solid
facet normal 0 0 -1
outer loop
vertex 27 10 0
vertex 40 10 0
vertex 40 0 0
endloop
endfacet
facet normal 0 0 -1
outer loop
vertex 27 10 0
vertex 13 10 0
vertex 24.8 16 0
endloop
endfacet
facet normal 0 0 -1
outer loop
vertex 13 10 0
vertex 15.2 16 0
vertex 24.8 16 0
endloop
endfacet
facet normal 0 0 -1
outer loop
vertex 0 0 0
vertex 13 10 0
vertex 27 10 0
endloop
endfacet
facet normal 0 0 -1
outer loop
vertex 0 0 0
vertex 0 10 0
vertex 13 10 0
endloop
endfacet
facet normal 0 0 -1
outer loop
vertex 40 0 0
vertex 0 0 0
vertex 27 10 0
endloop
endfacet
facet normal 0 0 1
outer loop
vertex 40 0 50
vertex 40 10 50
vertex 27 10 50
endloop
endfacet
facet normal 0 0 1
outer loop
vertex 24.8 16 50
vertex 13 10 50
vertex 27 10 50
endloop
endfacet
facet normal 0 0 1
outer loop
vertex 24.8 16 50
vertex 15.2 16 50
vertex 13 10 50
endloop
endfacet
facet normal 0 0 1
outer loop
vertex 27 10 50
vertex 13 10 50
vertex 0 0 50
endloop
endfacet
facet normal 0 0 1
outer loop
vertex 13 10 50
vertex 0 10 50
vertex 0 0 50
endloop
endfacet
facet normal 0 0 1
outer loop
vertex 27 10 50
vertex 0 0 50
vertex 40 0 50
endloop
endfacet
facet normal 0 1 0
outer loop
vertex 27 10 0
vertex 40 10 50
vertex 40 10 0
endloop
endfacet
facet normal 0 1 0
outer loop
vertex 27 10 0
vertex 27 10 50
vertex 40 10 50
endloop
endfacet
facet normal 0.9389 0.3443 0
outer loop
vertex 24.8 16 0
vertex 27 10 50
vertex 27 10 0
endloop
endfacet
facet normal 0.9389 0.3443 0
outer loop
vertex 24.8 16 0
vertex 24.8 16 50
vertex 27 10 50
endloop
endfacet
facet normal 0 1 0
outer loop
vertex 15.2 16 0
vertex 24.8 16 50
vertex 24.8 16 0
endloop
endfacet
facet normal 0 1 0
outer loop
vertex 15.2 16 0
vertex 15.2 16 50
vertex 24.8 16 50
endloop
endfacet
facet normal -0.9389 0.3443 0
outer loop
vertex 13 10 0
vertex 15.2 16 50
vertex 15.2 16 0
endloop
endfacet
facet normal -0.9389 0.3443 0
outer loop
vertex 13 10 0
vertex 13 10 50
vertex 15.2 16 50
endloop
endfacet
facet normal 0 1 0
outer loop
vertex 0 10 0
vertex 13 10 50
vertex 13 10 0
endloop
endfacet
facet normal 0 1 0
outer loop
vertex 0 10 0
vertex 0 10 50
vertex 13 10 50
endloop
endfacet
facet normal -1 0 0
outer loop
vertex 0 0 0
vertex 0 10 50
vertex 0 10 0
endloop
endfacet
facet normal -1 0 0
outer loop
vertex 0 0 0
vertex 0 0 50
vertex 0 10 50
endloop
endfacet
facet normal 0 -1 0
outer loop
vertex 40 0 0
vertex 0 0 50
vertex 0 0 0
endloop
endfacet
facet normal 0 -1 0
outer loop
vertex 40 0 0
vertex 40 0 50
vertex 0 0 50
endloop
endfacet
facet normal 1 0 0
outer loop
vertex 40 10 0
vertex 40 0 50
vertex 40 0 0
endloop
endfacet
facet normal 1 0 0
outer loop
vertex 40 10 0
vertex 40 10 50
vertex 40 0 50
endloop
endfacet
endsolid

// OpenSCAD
$fn = 32;

// ----------------------------------------------------------------------
// V guide rail: dovetail, 40 mm wide
// ----------------------------------------------------------------------

// --- parameters (mm) ---
rail_w = 40;              // rail width, X
base_t = 10;              // base plate thickness
v_depth = 6;              // V feature depth / height
v_half_w = 7;             // half width of the V at the base face
plate_t = 50;             // rail length, Z (the extrusion height)
top_half_w = 4.8;         // half width at the dovetail top

dovetail_base = 2 * v_half_w;  // dovetail width at the base
dovetail_top = 2 * top_half_w;  // dovetail width at the top

profile = [[0, 0], [40, 0], [40, 10], [27, 10], [24.8, 16], [15.2, 16], [13, 10], [0, 10]];  // primary outline, 8 points, counter clockwise

// --- the one profile operation ---
linear_extrude(height = plate_t) polygon(points = profile);
